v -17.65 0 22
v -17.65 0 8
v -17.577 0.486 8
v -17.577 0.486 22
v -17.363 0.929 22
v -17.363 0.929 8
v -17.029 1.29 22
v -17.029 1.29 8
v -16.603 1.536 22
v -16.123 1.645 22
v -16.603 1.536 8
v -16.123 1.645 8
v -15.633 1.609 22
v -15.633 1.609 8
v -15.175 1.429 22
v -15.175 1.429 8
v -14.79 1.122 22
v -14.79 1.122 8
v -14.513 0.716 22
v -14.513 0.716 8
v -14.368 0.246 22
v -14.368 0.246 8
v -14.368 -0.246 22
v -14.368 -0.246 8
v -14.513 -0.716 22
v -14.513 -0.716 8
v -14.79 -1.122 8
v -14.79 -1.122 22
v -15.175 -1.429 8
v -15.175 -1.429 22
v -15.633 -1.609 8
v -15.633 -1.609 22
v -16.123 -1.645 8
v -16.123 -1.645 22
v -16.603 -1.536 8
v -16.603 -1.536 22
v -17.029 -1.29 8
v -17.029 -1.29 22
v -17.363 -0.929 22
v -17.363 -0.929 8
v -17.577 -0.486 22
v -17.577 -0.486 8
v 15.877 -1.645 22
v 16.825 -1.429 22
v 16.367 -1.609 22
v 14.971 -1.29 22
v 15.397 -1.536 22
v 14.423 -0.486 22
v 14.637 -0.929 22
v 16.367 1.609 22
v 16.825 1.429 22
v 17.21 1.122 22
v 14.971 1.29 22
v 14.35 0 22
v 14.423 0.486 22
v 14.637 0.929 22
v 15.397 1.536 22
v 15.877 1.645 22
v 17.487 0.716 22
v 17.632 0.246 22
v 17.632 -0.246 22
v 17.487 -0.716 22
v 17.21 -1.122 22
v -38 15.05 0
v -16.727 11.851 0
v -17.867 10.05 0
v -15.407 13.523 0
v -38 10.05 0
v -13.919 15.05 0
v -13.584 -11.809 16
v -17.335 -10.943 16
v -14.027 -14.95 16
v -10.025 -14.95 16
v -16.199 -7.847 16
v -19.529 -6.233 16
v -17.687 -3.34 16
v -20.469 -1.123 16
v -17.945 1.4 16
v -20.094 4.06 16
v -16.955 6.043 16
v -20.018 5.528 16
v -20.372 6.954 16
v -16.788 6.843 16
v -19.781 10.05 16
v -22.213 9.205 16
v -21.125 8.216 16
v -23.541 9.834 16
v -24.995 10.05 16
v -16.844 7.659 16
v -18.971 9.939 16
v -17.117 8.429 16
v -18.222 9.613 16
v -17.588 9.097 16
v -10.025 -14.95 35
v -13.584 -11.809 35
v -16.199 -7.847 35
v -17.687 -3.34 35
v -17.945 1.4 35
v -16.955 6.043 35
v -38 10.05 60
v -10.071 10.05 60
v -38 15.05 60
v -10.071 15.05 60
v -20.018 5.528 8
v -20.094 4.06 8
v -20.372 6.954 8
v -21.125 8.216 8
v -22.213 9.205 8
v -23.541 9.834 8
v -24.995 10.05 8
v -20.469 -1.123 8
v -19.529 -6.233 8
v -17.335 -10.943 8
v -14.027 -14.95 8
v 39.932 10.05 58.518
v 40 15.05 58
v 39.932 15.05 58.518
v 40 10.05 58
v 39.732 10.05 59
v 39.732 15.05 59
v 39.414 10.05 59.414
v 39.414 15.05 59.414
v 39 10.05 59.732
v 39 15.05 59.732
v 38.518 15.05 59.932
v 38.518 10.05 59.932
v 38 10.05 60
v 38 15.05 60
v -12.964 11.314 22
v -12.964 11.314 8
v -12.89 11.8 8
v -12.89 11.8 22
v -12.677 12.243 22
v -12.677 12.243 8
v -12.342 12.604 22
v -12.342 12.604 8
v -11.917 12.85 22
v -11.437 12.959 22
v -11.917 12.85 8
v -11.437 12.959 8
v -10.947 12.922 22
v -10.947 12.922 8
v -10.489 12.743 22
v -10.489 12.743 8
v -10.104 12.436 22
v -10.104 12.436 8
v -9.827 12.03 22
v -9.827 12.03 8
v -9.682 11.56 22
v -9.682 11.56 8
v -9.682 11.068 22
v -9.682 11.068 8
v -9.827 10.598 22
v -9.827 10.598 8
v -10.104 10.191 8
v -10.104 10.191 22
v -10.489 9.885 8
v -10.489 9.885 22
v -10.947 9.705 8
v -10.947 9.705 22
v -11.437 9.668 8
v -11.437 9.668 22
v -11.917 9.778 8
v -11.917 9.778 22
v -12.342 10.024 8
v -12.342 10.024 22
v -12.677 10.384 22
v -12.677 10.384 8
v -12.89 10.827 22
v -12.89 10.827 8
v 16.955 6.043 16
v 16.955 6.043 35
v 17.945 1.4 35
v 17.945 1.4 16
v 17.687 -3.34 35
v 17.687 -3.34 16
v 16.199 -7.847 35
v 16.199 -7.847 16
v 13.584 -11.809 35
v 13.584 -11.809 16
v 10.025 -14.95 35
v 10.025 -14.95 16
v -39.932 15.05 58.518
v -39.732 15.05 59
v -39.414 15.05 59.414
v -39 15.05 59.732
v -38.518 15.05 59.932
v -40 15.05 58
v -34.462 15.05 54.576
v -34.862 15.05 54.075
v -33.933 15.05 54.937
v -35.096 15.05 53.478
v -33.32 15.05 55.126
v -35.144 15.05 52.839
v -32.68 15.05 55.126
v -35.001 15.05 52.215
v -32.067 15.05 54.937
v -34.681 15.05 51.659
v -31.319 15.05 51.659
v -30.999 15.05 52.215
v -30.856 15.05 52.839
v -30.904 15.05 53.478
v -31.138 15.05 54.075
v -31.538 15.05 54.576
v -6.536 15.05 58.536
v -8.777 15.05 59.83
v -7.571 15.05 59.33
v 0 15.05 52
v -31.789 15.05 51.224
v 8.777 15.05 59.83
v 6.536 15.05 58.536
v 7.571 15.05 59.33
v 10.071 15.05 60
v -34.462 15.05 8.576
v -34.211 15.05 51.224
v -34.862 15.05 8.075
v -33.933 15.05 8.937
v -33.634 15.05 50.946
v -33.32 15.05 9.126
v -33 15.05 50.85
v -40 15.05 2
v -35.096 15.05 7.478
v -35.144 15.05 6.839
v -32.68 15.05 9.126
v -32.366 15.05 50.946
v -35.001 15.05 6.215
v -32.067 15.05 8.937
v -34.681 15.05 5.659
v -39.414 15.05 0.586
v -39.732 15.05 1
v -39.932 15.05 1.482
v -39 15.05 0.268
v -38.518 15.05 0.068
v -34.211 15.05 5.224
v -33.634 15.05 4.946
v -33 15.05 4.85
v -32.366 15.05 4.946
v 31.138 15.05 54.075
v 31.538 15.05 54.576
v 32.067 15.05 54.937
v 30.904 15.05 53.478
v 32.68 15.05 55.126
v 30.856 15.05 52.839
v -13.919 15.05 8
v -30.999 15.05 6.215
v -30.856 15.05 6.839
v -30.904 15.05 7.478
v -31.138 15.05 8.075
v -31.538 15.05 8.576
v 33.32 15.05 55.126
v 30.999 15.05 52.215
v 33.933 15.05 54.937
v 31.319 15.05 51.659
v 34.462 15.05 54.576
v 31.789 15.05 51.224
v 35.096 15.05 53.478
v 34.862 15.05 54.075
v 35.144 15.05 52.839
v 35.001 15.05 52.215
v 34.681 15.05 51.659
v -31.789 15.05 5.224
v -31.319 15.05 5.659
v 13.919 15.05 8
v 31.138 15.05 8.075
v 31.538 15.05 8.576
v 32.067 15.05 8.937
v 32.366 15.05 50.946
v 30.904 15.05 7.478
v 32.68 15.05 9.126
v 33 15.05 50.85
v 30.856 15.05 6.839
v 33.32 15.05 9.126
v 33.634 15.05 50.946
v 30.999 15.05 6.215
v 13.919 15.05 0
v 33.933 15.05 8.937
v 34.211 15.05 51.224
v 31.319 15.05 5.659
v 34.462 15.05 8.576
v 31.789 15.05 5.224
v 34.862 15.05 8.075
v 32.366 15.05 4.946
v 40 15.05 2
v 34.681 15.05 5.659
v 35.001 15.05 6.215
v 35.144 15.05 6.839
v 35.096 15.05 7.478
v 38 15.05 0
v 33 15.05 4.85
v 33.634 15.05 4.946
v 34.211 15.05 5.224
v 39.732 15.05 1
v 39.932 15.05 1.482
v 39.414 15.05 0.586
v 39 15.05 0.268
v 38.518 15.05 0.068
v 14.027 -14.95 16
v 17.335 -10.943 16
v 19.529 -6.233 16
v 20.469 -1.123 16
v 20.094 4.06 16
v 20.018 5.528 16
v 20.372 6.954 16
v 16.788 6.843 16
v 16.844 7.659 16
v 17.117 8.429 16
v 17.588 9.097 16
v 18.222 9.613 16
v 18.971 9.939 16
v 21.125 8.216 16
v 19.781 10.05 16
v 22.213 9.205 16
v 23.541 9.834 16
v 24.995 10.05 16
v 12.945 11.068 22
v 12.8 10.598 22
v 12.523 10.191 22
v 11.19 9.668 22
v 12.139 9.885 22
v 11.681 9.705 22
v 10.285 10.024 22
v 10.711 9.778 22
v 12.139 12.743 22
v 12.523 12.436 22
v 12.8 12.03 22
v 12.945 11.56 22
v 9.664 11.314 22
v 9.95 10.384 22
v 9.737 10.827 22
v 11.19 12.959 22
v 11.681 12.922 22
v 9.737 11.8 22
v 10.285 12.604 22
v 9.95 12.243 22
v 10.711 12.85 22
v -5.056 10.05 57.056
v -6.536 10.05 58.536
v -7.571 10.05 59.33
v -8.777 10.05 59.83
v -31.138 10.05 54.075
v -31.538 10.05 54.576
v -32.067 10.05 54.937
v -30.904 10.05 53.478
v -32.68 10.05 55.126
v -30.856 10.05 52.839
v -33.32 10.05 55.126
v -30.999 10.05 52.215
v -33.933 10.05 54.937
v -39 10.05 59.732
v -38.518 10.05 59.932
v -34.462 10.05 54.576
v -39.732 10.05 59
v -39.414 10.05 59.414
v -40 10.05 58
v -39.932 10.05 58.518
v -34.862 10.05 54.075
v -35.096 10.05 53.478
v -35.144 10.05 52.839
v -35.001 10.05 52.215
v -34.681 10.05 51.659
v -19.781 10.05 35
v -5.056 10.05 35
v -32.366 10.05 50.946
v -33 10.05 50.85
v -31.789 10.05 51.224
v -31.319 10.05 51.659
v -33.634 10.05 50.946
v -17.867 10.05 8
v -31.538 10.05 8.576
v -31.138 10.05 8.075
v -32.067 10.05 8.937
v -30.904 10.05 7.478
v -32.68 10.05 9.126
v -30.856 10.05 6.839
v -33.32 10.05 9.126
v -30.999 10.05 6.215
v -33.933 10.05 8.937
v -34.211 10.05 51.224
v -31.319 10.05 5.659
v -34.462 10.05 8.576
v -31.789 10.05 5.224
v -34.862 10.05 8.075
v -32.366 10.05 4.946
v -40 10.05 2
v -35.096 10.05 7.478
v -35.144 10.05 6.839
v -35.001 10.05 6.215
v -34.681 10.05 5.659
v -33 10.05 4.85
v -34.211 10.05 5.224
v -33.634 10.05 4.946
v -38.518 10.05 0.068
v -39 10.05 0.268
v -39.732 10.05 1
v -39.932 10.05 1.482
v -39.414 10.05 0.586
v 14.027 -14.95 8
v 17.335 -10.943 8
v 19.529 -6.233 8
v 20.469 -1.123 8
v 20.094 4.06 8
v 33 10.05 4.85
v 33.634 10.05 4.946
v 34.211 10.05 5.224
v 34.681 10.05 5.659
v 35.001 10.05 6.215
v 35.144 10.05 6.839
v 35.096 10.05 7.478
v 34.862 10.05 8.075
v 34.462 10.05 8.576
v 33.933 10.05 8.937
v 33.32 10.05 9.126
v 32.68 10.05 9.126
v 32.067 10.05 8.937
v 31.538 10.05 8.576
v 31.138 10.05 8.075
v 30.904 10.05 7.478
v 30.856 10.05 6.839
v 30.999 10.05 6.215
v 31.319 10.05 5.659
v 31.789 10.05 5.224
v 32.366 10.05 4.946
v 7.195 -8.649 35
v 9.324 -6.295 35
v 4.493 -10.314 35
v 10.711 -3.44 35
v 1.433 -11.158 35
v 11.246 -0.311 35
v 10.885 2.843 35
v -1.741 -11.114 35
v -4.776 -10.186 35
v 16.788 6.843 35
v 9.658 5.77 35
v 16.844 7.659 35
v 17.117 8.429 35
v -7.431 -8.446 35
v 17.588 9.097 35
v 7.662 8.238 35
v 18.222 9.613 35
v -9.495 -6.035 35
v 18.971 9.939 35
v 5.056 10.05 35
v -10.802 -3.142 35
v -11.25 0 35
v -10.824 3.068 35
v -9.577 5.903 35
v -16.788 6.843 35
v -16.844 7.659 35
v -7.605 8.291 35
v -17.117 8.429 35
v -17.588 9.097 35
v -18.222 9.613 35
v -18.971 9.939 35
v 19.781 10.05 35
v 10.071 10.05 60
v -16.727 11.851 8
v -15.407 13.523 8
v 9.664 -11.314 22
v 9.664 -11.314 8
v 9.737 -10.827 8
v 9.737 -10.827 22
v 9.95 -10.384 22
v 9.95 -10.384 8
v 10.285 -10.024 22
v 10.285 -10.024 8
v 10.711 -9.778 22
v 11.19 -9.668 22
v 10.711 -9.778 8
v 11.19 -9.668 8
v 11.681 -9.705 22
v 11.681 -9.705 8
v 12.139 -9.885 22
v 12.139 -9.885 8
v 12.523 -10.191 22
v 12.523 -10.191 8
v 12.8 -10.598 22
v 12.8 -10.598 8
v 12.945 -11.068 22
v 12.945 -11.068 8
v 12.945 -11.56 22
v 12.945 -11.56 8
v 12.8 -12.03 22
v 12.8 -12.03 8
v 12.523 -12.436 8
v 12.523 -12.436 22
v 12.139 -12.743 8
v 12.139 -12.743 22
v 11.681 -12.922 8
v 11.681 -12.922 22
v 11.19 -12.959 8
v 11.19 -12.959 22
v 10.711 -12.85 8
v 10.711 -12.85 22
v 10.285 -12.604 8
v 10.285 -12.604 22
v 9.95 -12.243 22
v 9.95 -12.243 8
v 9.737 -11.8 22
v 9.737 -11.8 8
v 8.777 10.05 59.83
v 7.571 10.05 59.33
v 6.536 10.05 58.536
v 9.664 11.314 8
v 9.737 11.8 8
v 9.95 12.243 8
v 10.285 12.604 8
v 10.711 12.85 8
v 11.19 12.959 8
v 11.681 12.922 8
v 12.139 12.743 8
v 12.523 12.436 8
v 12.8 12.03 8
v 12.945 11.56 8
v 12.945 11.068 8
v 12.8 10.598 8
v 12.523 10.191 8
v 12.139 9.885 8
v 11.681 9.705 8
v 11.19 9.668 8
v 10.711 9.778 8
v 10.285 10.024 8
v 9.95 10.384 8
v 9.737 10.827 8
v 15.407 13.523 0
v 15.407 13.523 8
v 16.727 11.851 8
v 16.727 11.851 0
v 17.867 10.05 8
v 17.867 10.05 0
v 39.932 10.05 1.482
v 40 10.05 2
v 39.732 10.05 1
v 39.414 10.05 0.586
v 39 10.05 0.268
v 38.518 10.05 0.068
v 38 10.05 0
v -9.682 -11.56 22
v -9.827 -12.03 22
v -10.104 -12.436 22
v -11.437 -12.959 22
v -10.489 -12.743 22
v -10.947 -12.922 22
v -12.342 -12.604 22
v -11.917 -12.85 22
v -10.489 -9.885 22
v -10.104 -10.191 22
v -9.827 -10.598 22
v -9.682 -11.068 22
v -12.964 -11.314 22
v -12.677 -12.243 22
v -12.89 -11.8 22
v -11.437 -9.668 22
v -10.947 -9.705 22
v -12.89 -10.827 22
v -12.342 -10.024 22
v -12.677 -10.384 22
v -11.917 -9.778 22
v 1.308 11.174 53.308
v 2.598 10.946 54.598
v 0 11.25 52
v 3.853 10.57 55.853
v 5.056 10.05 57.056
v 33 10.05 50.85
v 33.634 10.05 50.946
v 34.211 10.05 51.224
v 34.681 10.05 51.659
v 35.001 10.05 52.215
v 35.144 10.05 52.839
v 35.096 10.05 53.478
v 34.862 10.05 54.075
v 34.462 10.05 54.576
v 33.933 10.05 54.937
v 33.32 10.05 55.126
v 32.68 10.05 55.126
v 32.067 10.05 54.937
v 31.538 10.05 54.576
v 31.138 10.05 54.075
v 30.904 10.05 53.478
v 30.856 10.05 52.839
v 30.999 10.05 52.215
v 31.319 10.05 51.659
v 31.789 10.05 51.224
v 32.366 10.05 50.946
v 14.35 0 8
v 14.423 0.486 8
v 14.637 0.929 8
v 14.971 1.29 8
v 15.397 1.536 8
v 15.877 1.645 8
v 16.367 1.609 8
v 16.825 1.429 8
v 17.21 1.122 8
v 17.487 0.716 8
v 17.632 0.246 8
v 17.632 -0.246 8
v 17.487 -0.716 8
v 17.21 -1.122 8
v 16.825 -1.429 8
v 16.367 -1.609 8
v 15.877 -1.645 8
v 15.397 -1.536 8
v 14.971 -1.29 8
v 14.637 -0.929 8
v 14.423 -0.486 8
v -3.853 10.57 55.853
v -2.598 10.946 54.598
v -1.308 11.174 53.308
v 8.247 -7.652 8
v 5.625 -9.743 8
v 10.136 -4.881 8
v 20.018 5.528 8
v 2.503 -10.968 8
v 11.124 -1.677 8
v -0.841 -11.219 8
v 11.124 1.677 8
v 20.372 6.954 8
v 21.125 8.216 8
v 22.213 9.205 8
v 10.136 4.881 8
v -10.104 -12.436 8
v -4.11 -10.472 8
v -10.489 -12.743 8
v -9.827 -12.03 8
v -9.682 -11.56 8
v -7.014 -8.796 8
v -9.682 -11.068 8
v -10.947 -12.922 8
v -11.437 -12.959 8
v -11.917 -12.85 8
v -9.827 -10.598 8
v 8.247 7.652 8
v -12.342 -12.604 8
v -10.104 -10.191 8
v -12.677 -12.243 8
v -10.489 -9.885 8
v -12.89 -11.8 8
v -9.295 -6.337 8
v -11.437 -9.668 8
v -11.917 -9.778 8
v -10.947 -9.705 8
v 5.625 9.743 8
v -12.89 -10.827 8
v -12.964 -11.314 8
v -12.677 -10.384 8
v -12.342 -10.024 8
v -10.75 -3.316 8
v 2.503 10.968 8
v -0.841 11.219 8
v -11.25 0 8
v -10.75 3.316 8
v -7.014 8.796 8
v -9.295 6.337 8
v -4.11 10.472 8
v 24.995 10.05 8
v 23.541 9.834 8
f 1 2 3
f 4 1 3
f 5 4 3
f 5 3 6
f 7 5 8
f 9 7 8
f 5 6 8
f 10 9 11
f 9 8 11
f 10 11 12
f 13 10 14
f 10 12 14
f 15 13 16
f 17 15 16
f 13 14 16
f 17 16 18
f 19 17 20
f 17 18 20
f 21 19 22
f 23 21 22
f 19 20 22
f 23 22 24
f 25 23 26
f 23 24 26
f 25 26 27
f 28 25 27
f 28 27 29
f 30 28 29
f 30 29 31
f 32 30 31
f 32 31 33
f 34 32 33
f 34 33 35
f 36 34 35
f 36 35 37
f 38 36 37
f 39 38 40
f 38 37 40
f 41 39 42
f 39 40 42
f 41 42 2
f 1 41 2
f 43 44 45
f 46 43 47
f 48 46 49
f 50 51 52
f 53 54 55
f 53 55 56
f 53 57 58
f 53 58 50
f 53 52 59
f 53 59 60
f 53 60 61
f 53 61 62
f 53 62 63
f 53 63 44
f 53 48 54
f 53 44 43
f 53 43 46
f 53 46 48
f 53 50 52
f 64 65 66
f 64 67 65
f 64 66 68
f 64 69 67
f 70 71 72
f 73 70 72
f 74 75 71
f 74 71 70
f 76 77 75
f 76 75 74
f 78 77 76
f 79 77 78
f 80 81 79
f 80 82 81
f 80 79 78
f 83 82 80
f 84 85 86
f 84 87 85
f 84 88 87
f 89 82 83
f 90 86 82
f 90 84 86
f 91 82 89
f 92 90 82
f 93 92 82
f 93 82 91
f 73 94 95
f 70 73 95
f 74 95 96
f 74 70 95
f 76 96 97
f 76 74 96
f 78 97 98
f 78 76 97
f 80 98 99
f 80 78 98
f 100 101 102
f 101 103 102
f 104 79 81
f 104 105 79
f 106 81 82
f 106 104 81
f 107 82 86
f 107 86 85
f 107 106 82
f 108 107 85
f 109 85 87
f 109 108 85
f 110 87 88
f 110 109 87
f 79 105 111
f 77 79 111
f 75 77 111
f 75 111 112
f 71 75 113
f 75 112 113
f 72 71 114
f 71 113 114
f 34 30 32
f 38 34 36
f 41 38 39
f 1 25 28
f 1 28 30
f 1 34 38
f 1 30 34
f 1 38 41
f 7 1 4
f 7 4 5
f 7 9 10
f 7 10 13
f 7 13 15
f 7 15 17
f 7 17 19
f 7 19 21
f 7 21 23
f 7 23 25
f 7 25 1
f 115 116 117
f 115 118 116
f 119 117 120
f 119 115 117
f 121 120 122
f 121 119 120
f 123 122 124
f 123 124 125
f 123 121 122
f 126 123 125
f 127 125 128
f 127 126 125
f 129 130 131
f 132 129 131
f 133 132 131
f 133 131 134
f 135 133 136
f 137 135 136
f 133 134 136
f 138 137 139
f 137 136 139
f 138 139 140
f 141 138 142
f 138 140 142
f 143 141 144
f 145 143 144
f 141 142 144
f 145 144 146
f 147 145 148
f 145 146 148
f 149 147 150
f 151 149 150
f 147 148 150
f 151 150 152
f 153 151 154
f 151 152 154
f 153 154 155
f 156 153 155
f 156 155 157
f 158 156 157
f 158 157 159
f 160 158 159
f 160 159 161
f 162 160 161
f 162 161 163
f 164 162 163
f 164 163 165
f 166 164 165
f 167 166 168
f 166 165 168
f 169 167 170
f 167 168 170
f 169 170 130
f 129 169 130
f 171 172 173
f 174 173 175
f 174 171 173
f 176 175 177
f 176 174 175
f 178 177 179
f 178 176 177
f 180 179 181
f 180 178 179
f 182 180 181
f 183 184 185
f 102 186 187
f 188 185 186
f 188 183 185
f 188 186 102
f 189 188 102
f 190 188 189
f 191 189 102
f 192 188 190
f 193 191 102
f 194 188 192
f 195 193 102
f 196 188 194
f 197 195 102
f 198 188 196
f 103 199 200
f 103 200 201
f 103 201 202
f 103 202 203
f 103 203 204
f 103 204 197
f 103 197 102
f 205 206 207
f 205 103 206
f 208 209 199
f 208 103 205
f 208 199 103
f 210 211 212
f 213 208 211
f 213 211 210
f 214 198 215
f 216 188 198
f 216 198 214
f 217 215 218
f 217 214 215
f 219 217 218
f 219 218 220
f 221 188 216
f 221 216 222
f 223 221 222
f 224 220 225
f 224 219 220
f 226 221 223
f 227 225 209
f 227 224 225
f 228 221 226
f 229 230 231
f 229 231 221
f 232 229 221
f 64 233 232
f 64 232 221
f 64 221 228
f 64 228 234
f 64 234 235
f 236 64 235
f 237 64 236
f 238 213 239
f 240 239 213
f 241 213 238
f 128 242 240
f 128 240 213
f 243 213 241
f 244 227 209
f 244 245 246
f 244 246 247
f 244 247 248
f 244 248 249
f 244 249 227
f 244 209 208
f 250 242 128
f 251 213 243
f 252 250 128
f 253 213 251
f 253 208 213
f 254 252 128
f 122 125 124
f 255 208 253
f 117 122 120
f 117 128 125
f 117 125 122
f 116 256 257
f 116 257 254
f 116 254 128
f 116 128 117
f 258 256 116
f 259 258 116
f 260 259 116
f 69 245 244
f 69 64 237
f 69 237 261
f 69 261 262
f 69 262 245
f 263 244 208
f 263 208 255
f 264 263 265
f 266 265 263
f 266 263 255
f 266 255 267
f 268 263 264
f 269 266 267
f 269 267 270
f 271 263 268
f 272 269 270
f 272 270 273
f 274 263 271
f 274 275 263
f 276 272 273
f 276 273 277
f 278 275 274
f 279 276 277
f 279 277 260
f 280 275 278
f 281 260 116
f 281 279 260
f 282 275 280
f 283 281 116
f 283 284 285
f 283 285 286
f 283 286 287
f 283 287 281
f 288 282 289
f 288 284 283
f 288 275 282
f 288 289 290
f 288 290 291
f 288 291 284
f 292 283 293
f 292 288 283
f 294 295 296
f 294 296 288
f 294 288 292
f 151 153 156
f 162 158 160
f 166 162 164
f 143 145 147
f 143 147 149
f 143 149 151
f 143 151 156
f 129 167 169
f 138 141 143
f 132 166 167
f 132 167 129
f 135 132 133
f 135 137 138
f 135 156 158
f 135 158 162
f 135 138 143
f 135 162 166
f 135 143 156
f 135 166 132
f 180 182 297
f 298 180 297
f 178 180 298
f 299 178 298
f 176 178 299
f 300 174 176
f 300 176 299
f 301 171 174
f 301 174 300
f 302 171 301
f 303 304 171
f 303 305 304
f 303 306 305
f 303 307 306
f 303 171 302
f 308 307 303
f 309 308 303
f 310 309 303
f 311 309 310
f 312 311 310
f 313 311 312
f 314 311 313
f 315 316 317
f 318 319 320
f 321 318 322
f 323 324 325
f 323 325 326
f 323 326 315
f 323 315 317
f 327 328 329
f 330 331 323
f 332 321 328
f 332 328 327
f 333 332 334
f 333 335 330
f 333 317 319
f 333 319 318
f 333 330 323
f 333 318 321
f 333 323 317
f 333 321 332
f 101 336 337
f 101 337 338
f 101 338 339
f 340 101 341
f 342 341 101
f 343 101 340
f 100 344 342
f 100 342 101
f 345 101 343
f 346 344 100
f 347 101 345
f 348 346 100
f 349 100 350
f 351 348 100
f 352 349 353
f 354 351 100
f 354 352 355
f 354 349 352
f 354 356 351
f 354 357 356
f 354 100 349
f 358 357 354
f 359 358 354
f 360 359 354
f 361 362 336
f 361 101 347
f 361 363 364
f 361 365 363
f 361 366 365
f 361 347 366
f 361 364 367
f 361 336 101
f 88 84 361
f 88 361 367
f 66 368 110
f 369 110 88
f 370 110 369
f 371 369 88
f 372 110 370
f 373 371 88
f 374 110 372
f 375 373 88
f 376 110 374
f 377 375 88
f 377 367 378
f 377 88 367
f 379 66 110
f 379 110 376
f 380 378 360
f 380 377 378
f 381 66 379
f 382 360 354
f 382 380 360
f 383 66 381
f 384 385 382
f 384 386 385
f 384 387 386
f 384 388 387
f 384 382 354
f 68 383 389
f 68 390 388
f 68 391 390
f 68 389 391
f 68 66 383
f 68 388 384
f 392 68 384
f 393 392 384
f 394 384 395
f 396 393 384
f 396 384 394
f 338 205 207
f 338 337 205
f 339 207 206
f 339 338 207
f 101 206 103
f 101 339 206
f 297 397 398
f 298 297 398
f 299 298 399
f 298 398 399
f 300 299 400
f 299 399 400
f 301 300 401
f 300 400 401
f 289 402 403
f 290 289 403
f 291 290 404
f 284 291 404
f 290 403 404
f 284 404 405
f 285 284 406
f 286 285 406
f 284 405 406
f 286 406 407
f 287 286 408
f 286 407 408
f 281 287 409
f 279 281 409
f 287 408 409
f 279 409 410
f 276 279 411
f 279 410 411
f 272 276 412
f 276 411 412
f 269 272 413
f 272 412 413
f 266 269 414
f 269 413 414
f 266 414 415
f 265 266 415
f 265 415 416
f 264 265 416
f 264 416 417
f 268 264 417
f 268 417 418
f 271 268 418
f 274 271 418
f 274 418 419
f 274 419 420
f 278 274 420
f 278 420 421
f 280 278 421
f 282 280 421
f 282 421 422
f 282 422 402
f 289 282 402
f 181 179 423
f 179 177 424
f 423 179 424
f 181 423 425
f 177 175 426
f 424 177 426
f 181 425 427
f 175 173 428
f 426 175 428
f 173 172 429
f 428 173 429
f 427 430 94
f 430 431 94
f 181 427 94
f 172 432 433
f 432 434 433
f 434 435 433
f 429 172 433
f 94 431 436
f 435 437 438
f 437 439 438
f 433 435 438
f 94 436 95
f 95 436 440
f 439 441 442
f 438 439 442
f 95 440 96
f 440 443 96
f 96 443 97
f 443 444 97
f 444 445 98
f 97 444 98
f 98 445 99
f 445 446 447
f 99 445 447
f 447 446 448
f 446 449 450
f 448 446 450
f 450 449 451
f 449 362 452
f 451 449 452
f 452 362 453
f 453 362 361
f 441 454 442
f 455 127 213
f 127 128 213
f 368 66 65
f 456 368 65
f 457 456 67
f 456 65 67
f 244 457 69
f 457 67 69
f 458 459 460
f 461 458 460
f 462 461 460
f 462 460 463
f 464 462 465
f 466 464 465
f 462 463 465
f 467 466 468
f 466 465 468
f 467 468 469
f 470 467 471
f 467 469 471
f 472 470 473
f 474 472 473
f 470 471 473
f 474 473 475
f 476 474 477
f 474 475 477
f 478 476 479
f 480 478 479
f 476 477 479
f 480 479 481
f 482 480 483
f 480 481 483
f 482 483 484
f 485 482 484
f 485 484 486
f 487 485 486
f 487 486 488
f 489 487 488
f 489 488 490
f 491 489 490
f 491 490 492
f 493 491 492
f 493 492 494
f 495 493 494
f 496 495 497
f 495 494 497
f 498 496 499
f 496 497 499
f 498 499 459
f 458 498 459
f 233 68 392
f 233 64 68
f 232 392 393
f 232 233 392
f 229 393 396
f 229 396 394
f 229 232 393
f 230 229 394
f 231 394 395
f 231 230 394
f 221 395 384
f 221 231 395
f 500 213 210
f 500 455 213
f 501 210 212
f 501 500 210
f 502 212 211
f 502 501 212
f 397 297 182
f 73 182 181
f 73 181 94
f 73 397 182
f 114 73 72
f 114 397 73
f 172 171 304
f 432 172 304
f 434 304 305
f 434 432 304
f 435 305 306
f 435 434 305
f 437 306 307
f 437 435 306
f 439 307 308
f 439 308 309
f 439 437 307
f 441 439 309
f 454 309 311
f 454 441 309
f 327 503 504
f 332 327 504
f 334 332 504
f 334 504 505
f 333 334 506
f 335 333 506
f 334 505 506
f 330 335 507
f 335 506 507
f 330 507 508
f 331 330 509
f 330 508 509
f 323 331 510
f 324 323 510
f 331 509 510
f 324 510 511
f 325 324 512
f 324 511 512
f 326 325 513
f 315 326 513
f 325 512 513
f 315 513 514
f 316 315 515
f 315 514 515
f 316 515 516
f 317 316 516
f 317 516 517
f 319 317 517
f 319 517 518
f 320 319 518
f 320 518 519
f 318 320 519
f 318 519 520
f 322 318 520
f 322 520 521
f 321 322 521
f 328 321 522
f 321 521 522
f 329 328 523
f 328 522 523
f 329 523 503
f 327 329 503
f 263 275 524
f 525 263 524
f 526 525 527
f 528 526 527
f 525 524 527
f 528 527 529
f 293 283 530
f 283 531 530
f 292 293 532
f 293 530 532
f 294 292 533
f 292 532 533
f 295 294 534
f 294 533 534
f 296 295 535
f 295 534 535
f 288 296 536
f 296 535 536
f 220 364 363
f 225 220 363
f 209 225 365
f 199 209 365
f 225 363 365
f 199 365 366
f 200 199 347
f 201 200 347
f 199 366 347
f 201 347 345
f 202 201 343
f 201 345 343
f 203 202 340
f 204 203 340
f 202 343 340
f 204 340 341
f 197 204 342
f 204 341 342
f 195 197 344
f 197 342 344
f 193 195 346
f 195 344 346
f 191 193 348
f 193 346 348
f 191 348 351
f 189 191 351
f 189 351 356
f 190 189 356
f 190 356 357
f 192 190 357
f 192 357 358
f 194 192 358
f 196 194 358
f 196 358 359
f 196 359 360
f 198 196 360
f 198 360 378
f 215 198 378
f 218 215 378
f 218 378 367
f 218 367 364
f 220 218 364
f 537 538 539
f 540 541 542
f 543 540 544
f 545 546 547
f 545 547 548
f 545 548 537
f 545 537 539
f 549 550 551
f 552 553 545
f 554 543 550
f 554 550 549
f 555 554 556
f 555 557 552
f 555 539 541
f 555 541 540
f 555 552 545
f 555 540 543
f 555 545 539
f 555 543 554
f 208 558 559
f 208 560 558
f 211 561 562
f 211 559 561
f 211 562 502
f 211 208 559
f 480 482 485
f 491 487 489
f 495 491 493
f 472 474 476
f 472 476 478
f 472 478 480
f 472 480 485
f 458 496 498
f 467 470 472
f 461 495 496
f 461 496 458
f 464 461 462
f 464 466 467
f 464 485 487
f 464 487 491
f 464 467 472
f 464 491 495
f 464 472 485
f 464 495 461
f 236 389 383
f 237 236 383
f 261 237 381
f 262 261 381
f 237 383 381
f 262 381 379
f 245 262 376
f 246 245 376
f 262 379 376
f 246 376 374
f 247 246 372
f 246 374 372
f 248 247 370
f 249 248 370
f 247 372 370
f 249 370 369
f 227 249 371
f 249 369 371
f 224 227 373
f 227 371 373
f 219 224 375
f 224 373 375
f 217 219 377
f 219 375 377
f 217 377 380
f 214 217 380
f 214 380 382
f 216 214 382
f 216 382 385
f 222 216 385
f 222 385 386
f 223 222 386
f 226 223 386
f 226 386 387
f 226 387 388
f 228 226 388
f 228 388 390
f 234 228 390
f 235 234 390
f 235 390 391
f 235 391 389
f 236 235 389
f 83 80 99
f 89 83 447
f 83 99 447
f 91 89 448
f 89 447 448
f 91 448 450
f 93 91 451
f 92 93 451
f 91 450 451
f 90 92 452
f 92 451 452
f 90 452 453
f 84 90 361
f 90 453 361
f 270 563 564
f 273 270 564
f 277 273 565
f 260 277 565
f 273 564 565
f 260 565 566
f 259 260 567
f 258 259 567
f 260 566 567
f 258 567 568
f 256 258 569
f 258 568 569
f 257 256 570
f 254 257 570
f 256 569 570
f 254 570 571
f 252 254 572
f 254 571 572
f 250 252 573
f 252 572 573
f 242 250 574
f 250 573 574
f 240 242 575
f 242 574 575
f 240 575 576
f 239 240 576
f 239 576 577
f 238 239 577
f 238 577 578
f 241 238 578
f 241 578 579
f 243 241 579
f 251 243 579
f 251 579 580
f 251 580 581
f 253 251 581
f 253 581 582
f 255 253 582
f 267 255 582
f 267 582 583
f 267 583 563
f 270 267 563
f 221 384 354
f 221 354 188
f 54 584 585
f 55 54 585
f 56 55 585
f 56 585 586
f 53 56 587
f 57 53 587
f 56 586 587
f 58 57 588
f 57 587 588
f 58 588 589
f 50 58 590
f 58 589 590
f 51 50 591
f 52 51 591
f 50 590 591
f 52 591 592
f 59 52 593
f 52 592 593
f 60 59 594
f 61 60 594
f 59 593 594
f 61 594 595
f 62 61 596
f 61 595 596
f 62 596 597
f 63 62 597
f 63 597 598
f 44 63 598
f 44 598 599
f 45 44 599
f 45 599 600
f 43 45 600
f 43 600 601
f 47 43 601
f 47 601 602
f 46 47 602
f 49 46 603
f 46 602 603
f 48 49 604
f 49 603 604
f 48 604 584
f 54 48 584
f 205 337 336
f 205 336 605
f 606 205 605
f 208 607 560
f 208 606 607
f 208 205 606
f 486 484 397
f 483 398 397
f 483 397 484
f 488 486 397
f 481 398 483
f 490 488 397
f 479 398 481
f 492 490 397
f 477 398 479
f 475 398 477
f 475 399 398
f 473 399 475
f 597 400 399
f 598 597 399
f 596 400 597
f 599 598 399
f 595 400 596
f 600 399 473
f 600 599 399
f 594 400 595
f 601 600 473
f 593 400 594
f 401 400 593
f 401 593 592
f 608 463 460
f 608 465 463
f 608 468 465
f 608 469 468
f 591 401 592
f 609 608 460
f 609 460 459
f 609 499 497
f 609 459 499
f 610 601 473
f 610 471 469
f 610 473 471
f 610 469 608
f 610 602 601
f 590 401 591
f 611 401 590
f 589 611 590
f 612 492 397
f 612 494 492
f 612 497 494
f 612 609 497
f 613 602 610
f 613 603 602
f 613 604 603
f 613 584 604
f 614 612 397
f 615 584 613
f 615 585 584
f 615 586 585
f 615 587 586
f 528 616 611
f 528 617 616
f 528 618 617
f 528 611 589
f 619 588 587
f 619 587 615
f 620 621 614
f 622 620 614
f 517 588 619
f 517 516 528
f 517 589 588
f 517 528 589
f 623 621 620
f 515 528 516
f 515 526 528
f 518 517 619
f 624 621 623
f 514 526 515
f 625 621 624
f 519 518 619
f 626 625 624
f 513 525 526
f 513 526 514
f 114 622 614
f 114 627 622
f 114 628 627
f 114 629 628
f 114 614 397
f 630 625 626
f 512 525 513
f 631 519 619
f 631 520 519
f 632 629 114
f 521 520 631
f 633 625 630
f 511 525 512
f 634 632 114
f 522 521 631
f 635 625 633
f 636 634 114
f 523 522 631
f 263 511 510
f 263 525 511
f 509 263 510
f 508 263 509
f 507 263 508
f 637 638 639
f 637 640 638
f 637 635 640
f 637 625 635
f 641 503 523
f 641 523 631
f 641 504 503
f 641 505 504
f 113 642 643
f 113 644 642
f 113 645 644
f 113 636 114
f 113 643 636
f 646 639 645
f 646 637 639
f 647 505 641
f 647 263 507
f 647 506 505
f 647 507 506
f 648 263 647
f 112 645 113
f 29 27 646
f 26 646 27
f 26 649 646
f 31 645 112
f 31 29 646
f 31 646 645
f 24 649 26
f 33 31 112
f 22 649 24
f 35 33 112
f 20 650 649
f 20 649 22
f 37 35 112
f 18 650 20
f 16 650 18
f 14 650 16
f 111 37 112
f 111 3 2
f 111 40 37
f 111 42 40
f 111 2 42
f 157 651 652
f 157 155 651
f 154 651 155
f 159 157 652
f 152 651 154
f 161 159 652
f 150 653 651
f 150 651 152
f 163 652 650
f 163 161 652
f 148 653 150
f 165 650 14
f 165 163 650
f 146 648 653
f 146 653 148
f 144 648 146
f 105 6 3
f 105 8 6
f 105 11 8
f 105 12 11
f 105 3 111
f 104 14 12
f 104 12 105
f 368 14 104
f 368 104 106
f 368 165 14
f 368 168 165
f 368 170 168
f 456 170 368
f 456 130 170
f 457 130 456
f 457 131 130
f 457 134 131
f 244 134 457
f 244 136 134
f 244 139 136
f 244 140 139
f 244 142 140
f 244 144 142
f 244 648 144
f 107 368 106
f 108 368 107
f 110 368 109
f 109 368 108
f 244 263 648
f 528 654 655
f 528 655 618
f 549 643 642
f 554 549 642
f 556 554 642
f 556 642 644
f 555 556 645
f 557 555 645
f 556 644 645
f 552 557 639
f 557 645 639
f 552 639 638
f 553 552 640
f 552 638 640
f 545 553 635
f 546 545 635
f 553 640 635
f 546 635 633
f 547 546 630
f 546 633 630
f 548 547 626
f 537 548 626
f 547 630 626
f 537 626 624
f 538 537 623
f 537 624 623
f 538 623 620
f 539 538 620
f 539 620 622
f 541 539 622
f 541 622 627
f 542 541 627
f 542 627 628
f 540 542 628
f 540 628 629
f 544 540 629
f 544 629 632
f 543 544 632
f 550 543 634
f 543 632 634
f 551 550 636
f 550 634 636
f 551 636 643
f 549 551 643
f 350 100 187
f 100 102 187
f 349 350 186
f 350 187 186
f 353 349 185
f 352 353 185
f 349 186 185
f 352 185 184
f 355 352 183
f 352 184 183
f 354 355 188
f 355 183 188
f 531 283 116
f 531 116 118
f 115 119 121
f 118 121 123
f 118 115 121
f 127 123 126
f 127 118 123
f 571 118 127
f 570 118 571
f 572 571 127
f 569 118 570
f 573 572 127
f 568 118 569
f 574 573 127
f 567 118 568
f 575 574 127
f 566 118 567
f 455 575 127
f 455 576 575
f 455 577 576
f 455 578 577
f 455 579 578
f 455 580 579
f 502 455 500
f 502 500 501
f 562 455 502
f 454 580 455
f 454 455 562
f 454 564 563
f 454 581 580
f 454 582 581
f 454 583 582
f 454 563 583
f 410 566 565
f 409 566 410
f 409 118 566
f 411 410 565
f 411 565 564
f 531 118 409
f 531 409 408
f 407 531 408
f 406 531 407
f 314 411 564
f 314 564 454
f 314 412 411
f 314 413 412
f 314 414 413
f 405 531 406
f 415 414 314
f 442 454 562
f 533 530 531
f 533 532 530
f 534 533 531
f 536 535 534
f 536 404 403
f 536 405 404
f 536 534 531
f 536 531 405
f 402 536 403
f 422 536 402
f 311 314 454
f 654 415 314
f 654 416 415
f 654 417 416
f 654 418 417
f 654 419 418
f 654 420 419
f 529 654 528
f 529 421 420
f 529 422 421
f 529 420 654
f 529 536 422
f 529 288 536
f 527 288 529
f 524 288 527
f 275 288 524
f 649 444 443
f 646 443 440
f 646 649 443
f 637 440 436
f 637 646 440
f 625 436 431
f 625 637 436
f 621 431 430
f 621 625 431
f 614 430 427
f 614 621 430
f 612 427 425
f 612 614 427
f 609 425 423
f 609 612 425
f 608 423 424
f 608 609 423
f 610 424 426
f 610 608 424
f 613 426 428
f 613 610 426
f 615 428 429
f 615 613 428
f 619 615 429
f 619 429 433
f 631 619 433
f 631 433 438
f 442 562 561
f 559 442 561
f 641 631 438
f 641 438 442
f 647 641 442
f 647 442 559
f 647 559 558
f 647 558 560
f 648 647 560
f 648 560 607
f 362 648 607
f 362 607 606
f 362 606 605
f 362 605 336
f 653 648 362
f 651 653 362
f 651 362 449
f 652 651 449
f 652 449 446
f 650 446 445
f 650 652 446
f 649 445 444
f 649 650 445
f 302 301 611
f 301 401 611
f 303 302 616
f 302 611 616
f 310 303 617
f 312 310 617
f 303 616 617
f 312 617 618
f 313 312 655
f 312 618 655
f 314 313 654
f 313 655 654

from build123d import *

# Parameters (mm, degrees)
SKETCH1_R           = 11.25
BOSS_EXTRUDE1_DEPTH = 60
SKETCH6_R           = 2.15
CUT_EXTRUDE5_DEPTH  = 77.321687612
CUT_EXTRUDE6_START  = -25
CUT_EXTRUDE6_DEPTH  = 25
FILLET3_R           = 2
CUT_EXTRUDE7_DEPTH  = 79.102496759
FILLET5_R           = 5
SKETCH9_R           = 20.5
CUT_EXTRUDE8_DEPTH  = 8
SKETCH10_R          = 11.25
BOSS_EXTRUDE2_DEPTH = 8
SKETCH12_R          = 1.65
CUT_EXTRUDE9_DEPTH  = 14
FILLET7_R           = 5
FILLET8_R           = 3


with BuildPart() as part:
    # Sketch1 → Boss-Extrude1 (new body)
    with BuildSketch(Plane.XY):
        with BuildLine():
            Line((-40, 15.05), (40, 15.05))
            Line((40, 15.05), (40, 10.05))
            Line((40, 10.05), (14.933100817, 10.05))
            ThreePointArc((14.933100817, 10.05), (17.662807084, -3.467743633), (10.024844138, -14.95))
            Line((10.024844138, -14.95), (-10.024844138, -14.95))
            ThreePointArc((-10.024844138, -14.95), (-17.662807084, -3.467743633), (-14.933100817, 10.05))
            Line((-14.933100817, 10.05), (-40, 10.05))
            Line((-40, 10.05), (-40, 15.05))
        make_face()
        with Locations(Location((0, 0, 0), (0, 0, 180))):
            Circle(SKETCH1_R, mode=Mode.SUBTRACT)
    extrude(amount=BOSS_EXTRUDE1_DEPTH)

    # Sketch6 → Cut-Extrude5 (cut, through all)
    with BuildSketch(Plane(origin=(0, 10.05, 0), x_dir=(-1, 0, 0), z_dir=(0, -1, 0))):
        with Locations(Location((33, -53, 0), (0, 0, 90))):
            Circle(SKETCH6_R)
        with Locations(Location((33, -7, 0), (0, 0, 90))):
            Circle(SKETCH6_R)
        with Locations(Location((-33, -53, 0), (0, 0, 90))):
            Circle(SKETCH6_R)
        with Locations(Location((-33, -7, 0), (0, 0, 90))):
            Circle(SKETCH6_R)
    extrude(amount=-CUT_EXTRUDE5_DEPTH, mode=Mode.SUBTRACT)

    # Sketch7 → Cut-Extrude6 (cut)
    with BuildSketch(Plane.XY.offset(60).offset(CUT_EXTRUDE6_START)):
        with BuildLine():
            Line((-14.933100817, 10.05), (14.933100817, 10.05))
            ThreePointArc((14.933100817, 10.05), (0, -18), (-14.933100817, 10.05))
        make_face()
    extrude(amount=CUT_EXTRUDE6_DEPTH, mode=Mode.SUBTRACT)

    # Fillet3
    fillet3_edges = [part.edges().sort_by_distance(p)[0] for p in [
        (-40, 12.55, 0),
        (40, 12.55, 60),
        (-40, 12.55, 60),
        (40, 12.55, 0),
    ]]
    fillet(fillet3_edges, radius=FILLET3_R)

    # Sketch8 → Cut-Extrude7 (cut, through all)
    with BuildSketch(Plane(origin=(0, 15.05, 0), x_dir=(1, 0, 0), z_dir=(0, 1, 0))):
        Polygon((0, -52), (8, -60), (-8, -60), align=None)
    extrude(amount=-CUT_EXTRUDE7_DEPTH, mode=Mode.SUBTRACT)

    # Fillet5
    fillet5_edges = [part.edges().sort_by_distance(p)[0] for p in [
        (-8, 12.55, 60),
        (8, 12.55, 60),
    ]]
    fillet(fillet5_edges, radius=FILLET5_R)

    # Sketch9 → Cut-Extrude8 (cut)
    with BuildSketch(Plane(origin=(0, 0, 0), x_dir=(-1, 0, 0), z_dir=(0, 0, -1))):
        Circle(SKETCH9_R)
    extrude(amount=-CUT_EXTRUDE8_DEPTH, mode=Mode.SUBTRACT)

    # Sketch10 → Boss-Extrude2 (add)
    with BuildSketch(Plane(origin=(0, 0, 8), x_dir=(-1, 0, 0), z_dir=(0, 0, -1))):
        with BuildLine():
            Line((-13.919321104, 15.05), (13.919321104, 15.05))
            ThreePointArc((13.919321104, 15.05), (20.499868756, 0.073355309), (14.026671023, -14.95))
            Line((14.026671023, -14.95), (-14.026671023, -14.95))
            ThreePointArc((-14.026671023, -14.95), (-20.499868756, 0.073355309), (-13.919321104, 15.05))
        make_face()
        Circle(SKETCH10_R, mode=Mode.SUBTRACT)
    extrude(amount=-BOSS_EXTRUDE2_DEPTH)

    # Sketch12 → Cut-Extrude9 (cut)
    with BuildSketch(Plane(origin=(0, 0, 8), x_dir=(-1, 0, 0), z_dir=(0, 0, -1))):
        with Locations((-16, 0)):
            Circle(SKETCH12_R)
        with Locations((-11.313708499, 11.313708499)):
            Circle(SKETCH12_R)
        with Locations((-11.313708499, -11.313708499)):
            Circle(SKETCH12_R)
        with Locations((11.313708499, -11.313708499)):
            Circle(SKETCH12_R)
        with Locations((16, 0)):
            Circle(SKETCH12_R)
        with Locations((11.313708499, 11.313708499)):
            Circle(SKETCH12_R)
    extrude(amount=-CUT_EXTRUDE9_DEPTH, mode=Mode.SUBTRACT)

    # Fillet7
    fillet7_edges = [part.edges().sort_by_distance(p)[0] for p in [
        (-17.867498426, 10.05, 12),
        (17.867498426, 10.05, 12),
    ]]
    fillet(fillet7_edges, radius=FILLET7_R)

    # Fillet8
    fillet8_edges = [part.edges().sort_by_distance(p)[0] for p in [
        (14.933100817, 10.05, 25.5),
        (-14.933100817, 10.05, 25.5),
    ]]
    fillet(fillet8_edges, radius=FILLET8_R)


solid = part.part
